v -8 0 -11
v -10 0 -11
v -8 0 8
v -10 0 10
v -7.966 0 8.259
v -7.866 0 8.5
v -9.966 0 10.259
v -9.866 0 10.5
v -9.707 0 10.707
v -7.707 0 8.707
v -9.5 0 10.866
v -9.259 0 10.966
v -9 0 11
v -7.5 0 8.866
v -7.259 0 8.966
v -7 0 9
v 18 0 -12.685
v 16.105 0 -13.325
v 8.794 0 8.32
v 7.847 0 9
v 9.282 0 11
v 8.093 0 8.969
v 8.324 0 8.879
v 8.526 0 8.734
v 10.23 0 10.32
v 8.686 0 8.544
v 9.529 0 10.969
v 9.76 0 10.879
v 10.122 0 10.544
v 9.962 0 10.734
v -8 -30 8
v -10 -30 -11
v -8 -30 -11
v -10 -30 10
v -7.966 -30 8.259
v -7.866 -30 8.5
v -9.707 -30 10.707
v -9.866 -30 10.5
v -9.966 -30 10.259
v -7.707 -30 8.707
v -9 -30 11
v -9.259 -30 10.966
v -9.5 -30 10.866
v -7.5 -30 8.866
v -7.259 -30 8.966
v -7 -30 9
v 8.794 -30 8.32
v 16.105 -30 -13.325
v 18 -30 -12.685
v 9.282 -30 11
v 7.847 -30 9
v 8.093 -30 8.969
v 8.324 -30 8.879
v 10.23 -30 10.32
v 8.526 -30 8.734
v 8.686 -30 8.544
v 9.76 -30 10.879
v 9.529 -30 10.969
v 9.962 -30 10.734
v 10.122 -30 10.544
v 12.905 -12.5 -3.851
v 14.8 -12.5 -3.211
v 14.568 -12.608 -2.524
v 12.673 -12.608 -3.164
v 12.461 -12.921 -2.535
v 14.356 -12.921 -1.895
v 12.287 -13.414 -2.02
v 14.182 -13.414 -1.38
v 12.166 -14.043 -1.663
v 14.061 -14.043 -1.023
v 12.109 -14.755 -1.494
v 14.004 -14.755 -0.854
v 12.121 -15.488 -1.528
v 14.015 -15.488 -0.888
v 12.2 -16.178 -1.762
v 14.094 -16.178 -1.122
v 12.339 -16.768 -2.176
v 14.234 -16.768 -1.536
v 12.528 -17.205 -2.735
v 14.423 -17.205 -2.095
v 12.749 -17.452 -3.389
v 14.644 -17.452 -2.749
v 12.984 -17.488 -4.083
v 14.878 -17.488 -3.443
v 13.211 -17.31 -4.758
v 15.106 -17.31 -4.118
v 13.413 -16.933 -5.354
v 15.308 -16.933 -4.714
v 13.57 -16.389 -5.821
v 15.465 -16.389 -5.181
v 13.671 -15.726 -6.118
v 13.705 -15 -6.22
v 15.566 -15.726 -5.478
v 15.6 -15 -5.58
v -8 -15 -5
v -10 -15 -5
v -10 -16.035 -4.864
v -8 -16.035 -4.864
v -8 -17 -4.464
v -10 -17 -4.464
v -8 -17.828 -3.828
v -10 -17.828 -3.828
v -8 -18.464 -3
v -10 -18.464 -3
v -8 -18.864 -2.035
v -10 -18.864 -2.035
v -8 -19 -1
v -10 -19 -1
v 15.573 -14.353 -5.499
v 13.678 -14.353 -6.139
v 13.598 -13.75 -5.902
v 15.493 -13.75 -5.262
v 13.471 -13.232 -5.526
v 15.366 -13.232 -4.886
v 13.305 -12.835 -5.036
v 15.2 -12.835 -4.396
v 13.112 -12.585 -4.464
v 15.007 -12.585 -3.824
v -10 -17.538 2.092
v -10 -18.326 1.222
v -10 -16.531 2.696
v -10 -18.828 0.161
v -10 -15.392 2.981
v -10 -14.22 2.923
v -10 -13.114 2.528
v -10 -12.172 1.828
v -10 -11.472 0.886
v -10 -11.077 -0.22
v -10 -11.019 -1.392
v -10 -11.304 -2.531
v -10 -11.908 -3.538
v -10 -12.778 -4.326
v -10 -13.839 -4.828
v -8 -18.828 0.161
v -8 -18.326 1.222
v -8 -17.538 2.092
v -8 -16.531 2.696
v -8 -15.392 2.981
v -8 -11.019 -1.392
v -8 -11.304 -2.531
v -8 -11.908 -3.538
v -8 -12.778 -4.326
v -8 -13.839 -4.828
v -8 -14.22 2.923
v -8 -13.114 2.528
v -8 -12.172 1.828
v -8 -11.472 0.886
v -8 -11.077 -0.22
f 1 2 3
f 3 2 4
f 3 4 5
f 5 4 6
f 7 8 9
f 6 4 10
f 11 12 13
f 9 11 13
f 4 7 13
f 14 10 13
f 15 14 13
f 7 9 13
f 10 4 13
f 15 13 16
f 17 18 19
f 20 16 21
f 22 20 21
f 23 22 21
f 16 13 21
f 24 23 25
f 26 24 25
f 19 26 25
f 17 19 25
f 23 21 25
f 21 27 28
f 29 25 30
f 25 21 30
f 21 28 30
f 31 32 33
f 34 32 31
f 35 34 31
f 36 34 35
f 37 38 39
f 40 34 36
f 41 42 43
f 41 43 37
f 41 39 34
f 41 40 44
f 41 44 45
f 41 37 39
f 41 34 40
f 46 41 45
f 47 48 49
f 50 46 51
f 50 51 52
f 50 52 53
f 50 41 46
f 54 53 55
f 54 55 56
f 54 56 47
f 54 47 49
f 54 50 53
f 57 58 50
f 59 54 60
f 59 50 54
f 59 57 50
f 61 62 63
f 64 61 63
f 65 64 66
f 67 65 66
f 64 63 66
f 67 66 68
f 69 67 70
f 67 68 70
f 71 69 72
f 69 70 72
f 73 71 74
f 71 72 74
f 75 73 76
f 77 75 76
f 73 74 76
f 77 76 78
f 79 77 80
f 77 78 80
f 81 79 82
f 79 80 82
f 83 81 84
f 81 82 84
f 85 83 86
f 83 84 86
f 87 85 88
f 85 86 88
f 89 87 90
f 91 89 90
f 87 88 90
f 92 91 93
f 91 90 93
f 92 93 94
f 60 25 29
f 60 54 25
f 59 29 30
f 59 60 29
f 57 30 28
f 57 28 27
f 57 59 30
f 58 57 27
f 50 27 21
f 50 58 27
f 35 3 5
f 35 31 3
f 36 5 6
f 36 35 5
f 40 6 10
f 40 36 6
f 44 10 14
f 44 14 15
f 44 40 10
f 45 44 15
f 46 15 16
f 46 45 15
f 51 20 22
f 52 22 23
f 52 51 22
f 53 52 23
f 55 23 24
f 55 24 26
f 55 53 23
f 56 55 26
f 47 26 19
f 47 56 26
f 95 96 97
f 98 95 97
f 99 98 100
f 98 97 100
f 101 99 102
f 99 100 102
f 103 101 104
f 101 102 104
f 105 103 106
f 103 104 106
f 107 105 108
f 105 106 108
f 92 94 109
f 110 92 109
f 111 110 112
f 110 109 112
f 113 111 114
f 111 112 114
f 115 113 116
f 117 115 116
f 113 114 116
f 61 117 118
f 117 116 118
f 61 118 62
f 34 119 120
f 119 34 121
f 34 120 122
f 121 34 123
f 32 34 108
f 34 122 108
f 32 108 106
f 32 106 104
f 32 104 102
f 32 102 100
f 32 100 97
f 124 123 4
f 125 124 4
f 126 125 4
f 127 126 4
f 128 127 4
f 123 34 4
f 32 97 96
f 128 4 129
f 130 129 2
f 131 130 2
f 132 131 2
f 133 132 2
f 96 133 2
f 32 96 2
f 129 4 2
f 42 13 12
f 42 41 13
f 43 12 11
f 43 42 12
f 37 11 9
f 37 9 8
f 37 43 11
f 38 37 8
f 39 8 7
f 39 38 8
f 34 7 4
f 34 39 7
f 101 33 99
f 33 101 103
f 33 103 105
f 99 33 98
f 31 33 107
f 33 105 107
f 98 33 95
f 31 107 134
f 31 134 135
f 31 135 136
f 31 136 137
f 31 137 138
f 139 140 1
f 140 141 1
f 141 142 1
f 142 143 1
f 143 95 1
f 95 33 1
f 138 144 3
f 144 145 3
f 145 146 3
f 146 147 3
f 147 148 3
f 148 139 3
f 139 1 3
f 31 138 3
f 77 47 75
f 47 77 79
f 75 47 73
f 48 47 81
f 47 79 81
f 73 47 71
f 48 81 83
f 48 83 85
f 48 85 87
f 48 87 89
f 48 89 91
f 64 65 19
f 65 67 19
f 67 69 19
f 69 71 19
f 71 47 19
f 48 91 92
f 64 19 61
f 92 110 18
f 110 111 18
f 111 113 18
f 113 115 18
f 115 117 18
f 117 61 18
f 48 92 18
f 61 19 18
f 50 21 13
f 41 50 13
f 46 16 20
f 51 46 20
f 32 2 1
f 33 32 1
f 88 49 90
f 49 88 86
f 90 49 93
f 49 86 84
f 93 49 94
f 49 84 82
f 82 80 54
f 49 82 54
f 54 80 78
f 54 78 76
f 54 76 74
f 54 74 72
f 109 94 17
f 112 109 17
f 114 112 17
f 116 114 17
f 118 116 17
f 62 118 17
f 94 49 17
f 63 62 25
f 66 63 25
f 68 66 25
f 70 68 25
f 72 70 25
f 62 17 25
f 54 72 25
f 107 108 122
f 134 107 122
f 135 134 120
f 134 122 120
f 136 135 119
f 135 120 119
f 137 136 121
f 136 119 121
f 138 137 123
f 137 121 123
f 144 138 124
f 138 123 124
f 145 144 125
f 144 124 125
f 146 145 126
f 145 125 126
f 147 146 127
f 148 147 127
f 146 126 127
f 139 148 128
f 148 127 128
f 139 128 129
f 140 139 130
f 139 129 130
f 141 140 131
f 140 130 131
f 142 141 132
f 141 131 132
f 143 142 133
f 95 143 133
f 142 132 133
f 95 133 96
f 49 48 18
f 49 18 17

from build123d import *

# Parameters (mm, degrees)
F1_DEPTH = 30
F2_R     = 1
F5_DEPTH = 3
F6_DEPTH = 3


with BuildPart() as f1:
    # F0 (on Front) → F1 (new body)
    with BuildSketch(Plane.XZ):
        Polygon((18, -12.6854385647), (10, 11), (-10, 11), (-10, -11), (-8, -11), (-8, 9), (8.5645188749, 9), (16.1051649148, -13.3254385647), align=None)
    extrude(amount=F1_DEPTH)

    # F2
    f2_edges = [f1.edges().sort_by_distance(p)[0] for p in [
        (10, -15, 11),
        (-10, -15, 11),
        (-8, -15, 9),
        (8.564519, -15, 9),
    ]]
    fillet(f2_edges, radius=F2_R)

    # F3 (on face) → F5 (cut)
    with BuildSketch(Plane(origin=(12.3109097499, 0, 4.1581361363), x_dir=(0, 1, 0), z_dir=(0.9474175426, 0, 0.32))):
        with BuildLine():
            ThreePointArc((-12.5, -7.7784070316), (-16.767766953, -6.0106400786), (-15, -10.2784070316))
            ThreePointArc((-15, -10.2784070316), (-13.232233047, -9.5461739845), (-12.5, -7.7784070316))
        make_face()
    extrude(amount=-F5_DEPTH, mode=Mode.SUBTRACT)

    # F4 (on face) → F6 (cut)
    with BuildSketch(Plane(origin=(-10, 0, 0), x_dir=(0, -1, 0), z_dir=(-1, 0, 0))):
        with BuildLine():
            ThreePointArc((19, -1), (12.1715728753, 1.8284271247), (15, -5))
            ThreePointArc((15, -5), (17.8284271247, -3.8284271247), (19, -1))
        make_face()
    extrude(amount=-F6_DEPTH, mode=Mode.SUBTRACT)


solid = f1.part
